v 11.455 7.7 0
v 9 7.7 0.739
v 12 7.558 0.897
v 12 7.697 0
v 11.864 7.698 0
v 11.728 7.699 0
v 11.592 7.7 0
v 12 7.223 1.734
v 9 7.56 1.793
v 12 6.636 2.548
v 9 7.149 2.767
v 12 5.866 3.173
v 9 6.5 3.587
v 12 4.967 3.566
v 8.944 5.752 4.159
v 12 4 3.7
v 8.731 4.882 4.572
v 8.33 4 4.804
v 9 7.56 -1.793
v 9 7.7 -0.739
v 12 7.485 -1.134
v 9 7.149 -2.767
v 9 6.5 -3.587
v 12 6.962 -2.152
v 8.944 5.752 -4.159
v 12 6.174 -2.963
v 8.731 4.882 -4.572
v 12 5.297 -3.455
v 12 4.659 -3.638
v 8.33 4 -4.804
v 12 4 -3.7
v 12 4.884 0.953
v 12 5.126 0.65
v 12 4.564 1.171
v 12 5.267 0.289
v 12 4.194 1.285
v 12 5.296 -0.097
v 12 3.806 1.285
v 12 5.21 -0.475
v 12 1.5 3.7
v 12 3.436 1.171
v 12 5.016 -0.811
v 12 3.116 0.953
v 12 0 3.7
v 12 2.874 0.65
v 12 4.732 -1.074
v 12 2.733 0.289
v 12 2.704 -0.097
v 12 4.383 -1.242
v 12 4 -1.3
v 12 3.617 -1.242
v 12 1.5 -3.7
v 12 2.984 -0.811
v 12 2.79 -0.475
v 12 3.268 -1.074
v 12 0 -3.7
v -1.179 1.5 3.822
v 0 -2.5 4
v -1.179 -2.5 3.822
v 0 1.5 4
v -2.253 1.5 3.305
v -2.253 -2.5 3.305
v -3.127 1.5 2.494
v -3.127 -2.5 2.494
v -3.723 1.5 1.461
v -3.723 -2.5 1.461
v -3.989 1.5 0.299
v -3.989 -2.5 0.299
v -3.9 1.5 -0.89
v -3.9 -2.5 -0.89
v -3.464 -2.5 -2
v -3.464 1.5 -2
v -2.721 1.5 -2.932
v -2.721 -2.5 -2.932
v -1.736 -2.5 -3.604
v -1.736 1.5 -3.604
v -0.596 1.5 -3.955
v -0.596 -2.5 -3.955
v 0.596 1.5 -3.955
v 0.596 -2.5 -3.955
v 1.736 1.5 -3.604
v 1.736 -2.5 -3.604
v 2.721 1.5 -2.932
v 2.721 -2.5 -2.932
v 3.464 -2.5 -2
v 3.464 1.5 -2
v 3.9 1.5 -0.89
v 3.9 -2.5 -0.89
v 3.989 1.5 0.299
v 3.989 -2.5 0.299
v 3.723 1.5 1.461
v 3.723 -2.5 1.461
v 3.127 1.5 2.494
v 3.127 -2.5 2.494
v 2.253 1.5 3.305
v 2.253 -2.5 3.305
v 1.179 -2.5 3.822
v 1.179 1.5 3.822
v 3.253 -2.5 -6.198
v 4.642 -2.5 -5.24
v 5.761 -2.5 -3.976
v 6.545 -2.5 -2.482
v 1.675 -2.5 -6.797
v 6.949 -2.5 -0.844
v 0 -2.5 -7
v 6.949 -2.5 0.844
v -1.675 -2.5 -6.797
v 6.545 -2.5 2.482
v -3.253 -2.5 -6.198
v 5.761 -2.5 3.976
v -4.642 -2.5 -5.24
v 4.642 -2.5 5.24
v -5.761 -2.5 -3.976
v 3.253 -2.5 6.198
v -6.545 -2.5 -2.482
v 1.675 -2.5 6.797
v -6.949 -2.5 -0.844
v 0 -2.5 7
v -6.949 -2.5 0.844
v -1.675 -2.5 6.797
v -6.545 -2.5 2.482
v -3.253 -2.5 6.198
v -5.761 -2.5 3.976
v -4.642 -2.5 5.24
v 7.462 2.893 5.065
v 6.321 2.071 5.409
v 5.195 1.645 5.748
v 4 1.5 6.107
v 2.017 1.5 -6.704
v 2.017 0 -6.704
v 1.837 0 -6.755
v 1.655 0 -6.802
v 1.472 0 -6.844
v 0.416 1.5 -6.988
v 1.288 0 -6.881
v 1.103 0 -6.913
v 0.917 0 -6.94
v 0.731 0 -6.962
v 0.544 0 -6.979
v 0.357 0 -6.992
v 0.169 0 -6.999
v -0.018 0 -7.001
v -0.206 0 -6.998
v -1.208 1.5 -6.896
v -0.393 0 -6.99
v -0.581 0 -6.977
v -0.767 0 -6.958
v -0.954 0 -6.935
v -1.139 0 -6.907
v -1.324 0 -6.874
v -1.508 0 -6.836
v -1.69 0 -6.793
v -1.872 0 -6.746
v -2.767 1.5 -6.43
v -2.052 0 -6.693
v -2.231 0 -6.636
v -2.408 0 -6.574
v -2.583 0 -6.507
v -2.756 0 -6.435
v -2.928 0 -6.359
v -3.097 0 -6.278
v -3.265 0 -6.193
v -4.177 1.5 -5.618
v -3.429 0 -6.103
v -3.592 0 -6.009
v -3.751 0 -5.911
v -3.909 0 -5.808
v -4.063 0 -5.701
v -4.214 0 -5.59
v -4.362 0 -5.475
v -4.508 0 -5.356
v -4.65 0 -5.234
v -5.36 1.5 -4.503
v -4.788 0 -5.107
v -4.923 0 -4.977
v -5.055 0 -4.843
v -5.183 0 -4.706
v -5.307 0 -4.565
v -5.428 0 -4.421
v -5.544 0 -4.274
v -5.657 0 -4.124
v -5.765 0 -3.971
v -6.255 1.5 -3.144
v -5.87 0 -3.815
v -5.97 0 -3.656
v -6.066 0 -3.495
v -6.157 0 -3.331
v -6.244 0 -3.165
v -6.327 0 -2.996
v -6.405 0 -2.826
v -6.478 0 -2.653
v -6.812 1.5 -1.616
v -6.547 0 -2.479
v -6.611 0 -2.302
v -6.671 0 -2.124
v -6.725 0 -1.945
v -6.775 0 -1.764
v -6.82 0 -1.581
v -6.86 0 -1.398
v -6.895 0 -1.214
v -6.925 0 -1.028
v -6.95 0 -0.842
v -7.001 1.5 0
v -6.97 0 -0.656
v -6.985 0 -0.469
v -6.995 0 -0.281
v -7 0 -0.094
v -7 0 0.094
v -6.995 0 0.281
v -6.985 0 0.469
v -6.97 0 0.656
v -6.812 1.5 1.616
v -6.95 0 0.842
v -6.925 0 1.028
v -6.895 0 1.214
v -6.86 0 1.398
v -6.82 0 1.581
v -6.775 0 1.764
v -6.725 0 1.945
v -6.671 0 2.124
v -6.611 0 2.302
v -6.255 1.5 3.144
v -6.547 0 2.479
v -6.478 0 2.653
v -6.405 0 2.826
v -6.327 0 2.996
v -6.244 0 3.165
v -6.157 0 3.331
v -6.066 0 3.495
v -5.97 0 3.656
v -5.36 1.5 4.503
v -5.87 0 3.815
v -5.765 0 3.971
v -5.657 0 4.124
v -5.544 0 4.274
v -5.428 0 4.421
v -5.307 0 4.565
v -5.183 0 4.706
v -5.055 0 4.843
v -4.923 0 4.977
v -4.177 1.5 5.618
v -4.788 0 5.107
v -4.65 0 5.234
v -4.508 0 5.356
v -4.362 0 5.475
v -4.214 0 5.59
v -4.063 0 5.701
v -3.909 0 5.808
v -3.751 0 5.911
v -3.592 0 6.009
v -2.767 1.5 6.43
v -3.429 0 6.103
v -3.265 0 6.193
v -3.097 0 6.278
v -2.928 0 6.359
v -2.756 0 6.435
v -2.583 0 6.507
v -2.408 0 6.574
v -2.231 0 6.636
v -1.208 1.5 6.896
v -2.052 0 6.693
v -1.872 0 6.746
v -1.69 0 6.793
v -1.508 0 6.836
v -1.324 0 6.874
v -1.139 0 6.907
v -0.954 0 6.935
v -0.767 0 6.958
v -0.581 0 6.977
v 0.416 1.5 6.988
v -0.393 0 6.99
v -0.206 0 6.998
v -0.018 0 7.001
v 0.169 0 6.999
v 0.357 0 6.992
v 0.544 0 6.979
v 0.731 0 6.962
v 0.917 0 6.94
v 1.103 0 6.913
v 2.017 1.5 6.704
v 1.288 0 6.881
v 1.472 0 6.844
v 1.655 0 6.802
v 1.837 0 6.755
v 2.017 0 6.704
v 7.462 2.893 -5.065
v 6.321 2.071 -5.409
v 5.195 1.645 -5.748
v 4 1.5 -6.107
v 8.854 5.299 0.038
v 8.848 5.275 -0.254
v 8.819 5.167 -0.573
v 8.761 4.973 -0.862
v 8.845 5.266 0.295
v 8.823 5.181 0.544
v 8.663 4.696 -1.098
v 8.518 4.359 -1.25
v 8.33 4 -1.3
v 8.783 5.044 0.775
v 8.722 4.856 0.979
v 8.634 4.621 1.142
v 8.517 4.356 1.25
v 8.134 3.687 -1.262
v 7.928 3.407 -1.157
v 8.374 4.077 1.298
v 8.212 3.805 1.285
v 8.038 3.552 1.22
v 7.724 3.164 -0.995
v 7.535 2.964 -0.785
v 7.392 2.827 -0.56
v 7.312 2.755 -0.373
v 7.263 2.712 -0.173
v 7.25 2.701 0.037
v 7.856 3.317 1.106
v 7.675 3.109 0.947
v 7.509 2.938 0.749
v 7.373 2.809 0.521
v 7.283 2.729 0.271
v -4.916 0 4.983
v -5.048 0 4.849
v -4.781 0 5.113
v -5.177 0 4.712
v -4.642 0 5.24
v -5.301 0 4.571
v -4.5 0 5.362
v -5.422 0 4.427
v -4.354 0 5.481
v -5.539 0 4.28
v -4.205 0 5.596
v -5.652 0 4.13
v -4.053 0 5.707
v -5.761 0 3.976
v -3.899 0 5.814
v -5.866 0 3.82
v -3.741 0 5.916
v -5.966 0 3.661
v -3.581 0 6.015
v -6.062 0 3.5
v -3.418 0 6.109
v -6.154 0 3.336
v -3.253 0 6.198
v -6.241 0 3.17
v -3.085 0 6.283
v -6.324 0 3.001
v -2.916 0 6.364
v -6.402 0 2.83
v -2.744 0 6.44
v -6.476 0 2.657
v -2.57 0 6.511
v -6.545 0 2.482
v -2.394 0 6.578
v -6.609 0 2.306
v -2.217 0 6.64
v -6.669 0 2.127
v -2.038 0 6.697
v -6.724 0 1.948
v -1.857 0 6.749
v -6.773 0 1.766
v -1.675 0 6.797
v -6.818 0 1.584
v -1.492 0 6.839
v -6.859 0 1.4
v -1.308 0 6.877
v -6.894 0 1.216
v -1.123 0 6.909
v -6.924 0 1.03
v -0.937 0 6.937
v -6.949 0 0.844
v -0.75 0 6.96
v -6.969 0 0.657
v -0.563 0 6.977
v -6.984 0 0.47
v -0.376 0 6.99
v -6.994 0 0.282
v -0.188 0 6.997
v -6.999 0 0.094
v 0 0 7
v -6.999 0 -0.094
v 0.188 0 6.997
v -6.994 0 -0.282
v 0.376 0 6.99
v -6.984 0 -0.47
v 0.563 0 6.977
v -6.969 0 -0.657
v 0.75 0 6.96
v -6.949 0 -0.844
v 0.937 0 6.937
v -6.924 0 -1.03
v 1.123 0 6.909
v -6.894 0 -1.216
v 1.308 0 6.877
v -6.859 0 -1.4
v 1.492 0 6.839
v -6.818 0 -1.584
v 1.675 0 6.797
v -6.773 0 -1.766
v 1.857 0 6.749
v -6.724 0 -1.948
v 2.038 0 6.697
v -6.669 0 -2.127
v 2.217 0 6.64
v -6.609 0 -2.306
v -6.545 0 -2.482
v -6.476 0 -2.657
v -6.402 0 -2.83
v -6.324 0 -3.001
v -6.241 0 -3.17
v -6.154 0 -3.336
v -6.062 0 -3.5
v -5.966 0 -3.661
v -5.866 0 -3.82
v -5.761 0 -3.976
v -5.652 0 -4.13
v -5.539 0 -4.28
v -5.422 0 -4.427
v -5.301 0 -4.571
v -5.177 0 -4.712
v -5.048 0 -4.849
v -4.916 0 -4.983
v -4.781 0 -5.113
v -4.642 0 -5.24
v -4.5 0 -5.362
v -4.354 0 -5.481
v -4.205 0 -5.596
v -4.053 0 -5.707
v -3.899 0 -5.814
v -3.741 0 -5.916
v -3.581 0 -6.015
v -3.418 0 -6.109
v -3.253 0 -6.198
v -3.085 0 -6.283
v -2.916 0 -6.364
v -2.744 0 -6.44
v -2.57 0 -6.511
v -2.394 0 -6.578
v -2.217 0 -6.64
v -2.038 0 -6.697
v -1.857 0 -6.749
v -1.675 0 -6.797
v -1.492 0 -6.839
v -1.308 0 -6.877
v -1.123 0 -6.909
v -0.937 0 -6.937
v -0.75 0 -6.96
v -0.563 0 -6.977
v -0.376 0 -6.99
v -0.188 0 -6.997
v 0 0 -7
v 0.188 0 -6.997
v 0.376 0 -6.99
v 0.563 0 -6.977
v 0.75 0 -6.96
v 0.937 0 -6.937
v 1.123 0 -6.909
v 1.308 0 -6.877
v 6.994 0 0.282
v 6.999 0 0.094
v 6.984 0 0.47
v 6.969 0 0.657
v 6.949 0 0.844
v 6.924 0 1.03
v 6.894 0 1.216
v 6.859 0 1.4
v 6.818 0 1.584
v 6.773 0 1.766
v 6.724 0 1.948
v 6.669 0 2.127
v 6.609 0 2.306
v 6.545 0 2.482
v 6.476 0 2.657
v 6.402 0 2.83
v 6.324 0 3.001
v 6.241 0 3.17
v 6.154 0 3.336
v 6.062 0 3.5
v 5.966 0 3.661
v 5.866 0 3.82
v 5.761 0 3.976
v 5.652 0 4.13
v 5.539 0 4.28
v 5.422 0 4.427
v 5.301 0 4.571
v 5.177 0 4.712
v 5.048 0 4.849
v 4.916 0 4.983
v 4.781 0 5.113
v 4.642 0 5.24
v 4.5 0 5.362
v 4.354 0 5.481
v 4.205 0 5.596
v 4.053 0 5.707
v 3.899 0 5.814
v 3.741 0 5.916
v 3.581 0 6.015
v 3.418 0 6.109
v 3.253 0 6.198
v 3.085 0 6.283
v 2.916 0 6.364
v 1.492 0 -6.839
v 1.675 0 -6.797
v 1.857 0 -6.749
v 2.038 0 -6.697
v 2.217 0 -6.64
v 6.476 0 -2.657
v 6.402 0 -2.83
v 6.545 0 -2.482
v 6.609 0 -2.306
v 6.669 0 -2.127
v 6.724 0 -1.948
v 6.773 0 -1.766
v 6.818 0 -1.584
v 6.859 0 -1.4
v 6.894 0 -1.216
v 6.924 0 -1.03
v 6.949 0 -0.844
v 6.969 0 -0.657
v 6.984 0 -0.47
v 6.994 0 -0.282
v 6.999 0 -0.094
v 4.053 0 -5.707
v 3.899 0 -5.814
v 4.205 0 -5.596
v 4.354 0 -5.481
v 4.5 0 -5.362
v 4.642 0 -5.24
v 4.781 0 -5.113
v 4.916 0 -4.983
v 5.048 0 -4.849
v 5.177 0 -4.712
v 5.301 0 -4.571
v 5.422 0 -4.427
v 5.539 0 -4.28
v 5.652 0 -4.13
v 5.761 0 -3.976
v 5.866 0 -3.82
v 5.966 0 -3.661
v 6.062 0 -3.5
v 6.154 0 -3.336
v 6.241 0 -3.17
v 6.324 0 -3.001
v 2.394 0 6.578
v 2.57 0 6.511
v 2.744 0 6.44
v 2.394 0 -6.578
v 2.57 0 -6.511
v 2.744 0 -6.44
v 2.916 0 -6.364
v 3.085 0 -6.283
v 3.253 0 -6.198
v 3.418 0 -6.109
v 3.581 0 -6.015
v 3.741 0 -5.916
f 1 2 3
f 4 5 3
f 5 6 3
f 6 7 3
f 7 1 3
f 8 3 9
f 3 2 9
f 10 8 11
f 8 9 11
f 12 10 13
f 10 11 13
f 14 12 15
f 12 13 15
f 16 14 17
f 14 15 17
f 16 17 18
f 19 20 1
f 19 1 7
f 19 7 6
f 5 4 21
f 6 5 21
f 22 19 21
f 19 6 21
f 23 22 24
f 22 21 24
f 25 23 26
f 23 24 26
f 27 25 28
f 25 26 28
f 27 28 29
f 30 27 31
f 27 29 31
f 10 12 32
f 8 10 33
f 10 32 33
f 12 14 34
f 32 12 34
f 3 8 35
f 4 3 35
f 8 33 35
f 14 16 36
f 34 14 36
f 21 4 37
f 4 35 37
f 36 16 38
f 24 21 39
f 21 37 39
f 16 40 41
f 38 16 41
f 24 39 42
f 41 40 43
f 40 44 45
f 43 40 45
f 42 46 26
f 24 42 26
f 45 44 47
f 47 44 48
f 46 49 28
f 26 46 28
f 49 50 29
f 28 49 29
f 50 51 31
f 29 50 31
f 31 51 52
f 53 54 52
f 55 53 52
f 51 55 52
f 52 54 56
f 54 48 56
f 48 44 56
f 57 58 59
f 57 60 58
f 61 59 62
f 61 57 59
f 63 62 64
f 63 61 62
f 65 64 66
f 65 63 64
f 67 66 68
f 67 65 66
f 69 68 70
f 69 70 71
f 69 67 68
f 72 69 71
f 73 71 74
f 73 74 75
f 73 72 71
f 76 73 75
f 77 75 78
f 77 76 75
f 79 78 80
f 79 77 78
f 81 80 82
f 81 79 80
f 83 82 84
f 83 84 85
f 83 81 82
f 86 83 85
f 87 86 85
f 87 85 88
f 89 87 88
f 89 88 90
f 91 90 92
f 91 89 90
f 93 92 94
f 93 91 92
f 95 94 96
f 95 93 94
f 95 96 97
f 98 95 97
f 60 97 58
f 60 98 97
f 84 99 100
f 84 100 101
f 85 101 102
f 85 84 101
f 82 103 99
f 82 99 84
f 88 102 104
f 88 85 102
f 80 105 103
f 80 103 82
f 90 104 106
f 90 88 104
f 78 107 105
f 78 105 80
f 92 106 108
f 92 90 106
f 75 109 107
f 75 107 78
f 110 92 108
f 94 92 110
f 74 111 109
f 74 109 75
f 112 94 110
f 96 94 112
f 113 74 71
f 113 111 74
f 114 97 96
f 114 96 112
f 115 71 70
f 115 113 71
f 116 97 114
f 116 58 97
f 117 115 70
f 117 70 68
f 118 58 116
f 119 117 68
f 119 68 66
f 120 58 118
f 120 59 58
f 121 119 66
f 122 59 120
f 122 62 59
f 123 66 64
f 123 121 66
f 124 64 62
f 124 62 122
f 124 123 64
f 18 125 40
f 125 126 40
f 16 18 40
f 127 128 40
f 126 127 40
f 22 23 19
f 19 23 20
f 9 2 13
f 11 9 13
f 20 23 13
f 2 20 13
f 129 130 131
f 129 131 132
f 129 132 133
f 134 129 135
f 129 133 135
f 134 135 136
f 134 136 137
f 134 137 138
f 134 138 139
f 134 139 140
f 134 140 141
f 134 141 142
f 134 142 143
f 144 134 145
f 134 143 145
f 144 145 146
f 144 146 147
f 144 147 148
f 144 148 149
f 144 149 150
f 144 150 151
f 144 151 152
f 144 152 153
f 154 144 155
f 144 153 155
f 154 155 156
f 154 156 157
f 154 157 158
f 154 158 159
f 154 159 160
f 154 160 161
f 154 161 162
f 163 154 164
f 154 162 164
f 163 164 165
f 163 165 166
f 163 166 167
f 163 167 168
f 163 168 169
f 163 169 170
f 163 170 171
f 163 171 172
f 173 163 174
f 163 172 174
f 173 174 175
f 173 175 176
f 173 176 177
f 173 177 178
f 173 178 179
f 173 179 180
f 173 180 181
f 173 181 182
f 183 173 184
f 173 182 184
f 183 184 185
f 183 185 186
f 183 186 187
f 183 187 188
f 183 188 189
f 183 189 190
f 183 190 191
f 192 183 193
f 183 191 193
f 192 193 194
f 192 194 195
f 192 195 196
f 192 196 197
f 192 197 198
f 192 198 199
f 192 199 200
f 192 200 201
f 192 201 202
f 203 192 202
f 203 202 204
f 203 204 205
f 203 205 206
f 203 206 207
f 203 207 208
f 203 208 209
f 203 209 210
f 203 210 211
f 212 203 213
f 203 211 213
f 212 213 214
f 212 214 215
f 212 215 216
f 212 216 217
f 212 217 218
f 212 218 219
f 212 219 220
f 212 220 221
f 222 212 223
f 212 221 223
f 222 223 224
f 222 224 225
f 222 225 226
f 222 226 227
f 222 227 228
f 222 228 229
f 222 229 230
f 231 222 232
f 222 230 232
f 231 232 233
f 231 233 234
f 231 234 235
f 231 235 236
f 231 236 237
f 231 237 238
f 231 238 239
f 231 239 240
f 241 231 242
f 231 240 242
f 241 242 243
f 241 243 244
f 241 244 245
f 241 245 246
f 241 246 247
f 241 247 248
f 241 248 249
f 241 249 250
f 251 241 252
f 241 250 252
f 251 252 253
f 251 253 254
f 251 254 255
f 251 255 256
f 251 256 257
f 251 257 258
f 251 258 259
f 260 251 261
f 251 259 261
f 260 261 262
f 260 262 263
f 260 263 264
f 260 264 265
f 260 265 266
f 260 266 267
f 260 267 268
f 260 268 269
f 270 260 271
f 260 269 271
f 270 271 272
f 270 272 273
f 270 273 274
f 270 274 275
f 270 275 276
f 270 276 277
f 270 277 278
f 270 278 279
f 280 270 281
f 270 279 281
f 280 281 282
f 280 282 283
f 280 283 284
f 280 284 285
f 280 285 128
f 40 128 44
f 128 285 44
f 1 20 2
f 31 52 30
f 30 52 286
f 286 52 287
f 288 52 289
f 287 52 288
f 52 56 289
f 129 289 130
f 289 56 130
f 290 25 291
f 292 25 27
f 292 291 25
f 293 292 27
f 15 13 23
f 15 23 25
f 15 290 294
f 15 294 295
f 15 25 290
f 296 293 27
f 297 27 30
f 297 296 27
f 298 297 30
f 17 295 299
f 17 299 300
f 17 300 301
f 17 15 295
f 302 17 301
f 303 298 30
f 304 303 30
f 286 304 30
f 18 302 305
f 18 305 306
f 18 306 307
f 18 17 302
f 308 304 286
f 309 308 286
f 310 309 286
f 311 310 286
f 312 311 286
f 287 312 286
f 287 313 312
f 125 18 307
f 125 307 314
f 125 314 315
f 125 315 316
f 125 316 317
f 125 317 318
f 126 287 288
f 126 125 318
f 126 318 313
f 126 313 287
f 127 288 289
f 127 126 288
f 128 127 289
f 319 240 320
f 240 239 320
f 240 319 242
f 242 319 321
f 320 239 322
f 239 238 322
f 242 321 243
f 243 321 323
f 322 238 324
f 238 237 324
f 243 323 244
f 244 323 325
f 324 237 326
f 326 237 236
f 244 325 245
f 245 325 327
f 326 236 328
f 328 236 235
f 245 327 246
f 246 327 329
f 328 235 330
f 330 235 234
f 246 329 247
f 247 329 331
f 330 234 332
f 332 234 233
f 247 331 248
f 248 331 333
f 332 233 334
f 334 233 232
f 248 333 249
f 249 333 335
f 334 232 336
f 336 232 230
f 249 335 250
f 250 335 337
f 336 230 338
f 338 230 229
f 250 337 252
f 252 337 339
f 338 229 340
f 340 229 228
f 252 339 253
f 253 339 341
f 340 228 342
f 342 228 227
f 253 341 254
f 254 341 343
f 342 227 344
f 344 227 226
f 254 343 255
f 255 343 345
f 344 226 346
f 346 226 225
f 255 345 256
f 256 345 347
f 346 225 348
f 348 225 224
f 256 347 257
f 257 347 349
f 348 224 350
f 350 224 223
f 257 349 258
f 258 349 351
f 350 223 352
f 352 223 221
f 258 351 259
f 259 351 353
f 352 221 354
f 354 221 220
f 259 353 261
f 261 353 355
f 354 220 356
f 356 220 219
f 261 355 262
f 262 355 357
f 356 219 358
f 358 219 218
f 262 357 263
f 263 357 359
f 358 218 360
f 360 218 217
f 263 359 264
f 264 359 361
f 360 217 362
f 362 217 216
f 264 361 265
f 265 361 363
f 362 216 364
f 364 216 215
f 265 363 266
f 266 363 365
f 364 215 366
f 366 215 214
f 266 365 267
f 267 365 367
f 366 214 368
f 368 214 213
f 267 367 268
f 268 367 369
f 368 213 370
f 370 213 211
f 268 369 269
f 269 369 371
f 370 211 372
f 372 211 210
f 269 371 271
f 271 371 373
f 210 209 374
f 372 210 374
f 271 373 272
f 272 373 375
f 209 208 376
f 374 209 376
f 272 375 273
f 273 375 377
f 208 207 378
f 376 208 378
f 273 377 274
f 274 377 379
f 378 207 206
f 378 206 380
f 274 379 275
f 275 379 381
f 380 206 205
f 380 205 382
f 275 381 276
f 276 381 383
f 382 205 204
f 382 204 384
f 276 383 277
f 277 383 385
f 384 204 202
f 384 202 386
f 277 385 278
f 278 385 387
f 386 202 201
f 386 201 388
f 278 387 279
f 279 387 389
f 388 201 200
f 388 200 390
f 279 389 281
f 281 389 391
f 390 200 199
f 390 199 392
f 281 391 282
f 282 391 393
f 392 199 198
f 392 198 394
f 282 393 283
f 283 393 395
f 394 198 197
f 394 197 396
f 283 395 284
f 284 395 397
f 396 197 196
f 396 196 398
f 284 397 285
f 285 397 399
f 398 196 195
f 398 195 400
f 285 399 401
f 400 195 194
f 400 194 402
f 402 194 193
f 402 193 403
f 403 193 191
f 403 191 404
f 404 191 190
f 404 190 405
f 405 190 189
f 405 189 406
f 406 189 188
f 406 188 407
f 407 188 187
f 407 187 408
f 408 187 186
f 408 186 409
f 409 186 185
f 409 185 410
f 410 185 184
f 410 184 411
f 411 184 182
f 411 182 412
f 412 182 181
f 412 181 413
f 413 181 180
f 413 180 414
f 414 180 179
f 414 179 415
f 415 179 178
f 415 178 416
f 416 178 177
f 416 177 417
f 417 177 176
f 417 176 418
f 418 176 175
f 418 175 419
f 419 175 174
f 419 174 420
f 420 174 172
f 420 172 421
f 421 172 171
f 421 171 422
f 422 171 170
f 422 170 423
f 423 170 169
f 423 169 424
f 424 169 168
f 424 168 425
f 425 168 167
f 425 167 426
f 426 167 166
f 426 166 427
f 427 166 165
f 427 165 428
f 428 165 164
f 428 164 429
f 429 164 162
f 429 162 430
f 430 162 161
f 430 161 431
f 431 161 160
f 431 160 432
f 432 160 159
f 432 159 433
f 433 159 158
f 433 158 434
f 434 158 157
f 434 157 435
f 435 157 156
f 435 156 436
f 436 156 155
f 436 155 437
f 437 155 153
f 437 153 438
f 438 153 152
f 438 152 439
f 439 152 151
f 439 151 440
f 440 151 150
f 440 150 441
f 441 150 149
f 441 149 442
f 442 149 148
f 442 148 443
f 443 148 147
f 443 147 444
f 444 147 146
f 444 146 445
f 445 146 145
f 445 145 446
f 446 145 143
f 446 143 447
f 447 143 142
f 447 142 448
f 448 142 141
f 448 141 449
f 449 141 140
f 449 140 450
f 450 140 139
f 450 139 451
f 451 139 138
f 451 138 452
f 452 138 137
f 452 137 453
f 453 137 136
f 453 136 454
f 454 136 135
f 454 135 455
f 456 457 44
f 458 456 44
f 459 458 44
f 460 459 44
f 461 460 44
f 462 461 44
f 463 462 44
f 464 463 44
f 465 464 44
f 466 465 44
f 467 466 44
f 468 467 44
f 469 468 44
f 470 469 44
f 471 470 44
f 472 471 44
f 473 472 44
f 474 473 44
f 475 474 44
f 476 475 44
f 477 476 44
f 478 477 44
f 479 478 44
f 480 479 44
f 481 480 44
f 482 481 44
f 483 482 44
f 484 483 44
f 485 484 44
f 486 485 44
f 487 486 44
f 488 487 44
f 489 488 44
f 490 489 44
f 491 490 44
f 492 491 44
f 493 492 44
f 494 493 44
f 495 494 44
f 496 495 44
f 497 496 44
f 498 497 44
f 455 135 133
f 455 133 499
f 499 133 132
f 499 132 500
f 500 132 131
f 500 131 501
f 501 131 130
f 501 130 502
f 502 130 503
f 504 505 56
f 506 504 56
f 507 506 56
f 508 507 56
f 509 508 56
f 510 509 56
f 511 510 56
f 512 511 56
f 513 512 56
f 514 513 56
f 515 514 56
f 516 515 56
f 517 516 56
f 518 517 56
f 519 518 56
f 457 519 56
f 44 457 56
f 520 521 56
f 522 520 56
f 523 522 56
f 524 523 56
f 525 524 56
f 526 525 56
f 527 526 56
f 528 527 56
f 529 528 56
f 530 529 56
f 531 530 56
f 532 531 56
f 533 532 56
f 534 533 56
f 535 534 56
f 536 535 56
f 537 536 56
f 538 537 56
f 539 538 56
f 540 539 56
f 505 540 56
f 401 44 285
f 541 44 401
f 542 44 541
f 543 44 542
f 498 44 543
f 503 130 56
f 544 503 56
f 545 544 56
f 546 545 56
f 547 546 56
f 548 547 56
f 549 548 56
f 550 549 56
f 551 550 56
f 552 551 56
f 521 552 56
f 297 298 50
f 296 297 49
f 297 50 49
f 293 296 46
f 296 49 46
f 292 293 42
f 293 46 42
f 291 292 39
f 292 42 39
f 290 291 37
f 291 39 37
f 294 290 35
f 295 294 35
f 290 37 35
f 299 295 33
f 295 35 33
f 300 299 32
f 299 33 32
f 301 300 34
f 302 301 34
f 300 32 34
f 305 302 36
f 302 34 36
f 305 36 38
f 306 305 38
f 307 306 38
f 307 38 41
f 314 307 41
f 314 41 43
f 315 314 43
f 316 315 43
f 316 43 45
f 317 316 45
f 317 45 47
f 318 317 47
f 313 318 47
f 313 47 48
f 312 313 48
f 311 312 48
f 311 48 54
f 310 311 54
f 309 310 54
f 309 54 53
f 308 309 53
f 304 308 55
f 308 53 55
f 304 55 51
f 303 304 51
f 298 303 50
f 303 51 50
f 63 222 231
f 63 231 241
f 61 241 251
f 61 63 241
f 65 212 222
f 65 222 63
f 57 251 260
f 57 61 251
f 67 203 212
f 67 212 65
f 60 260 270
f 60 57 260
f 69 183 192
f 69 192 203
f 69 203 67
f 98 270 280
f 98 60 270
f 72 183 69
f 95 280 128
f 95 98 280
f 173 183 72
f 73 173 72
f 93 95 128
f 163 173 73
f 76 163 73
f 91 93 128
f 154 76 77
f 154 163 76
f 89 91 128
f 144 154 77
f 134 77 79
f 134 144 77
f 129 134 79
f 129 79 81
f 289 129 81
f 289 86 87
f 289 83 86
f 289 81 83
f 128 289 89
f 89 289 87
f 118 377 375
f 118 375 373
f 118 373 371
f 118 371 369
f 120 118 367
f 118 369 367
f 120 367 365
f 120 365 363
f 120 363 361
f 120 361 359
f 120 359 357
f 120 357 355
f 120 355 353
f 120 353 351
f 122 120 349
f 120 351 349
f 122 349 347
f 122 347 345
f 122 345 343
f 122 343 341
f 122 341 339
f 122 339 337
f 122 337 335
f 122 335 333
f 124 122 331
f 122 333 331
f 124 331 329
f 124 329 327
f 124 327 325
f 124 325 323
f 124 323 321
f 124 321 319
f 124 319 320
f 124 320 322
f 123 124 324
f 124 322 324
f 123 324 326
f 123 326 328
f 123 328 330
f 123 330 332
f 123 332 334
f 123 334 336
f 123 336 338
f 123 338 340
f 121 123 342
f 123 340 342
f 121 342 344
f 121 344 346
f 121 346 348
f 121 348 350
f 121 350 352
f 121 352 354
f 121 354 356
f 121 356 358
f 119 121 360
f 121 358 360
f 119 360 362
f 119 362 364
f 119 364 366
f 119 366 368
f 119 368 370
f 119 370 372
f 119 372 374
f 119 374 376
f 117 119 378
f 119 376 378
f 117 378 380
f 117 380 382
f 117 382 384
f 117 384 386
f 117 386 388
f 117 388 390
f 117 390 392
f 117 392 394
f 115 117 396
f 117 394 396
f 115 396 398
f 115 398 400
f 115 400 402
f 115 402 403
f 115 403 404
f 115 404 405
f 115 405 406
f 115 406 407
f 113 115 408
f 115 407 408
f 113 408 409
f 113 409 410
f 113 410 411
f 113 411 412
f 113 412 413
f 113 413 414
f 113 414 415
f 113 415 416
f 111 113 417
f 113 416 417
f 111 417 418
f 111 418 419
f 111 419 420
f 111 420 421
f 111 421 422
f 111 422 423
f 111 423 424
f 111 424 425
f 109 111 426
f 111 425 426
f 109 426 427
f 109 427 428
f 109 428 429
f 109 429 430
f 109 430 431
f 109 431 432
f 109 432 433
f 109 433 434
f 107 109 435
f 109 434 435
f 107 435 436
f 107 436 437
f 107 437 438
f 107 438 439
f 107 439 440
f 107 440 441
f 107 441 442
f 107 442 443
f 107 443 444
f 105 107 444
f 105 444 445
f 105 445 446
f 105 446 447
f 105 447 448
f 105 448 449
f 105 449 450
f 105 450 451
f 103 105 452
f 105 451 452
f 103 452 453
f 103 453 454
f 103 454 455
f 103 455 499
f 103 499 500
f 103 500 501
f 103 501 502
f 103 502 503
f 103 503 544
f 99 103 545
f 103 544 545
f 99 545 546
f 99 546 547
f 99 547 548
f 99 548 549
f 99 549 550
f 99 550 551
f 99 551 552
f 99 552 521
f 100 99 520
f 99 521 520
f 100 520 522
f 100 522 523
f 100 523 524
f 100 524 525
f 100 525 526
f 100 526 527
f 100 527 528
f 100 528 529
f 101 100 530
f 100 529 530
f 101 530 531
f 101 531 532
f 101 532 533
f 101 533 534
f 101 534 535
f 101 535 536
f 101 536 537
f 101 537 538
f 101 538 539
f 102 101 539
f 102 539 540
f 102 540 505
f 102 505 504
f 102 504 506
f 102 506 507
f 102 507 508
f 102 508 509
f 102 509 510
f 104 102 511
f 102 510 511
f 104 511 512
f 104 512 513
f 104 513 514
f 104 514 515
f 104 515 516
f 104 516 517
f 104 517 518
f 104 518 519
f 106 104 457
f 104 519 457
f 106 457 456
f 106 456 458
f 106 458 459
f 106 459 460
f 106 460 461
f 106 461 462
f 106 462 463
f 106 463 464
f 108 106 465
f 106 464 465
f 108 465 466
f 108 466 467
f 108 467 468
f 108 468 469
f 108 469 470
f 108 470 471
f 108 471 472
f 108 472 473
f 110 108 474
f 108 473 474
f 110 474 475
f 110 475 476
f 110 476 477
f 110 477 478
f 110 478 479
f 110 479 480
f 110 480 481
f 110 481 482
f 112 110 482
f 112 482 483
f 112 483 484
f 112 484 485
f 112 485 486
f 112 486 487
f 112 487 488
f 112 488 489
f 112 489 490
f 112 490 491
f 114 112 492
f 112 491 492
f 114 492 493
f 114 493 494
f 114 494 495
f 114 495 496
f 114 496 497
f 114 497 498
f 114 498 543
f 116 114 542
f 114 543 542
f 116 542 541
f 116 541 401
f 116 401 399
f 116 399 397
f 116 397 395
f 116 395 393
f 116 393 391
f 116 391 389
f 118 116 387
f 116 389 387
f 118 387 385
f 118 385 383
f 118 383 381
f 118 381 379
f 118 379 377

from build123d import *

# Parameters (mm, degrees)
SKETCH_1_R          = 7
EXTRUDE_1_DEPTH     = 1.5
SKETCH_3_R          = 4
CUT_EXTRUDE_2_DEPTH = 11.012492197
EXTRUDE_START       = -1.5
SKETCH_5_R          = 7
EXTRUDE_2_DEPTH     = 1.5
SKETCH_11_R         = 7
SKETCH_11_R_2       = 4
EXTRUDE_4_DEPTH     = 2.5
EXTRUDE_6_DEPTH     = 6.2
FILLET_1_R          = 5
SKETCH_12_R         = 1.3
CUT_EXTRUDE_3_DEPTH = 22.663858813
FILLET_2_R          = 3.7


with BuildPart() as part:
    # Эскиз1 → Бобышка-Вытянуть1 (new body)
    with BuildSketch(Plane(origin=(0, 0, 0), x_dir=(1, 0, 0), z_dir=(0, 1, 0))):
        with Locations(Location((0, 0, 0), (0, 0, 270))):
            Circle(SKETCH_1_R)
    extrude(amount=EXTRUDE_1_DEPTH)

    # Эскиз3 → Вырез-Вытянуть2 (cut, through all)
    with BuildSketch(Plane(origin=(0, 1.5, 0), x_dir=(1, 0, 0), z_dir=(0, 1, 0))):
        with Locations(Location((0, 0, 0), (0, 0, 270))):
            Circle(SKETCH_3_R)
    extrude(amount=-CUT_EXTRUDE_2_DEPTH, mode=Mode.SUBTRACT)

    # Эскиз5 → Бобышка-Вытянуть2 (add)
    with BuildSketch(Plane(origin=(0, 1.5, 0), x_dir=(1, 0, 0), z_dir=(0, 1, 0)).offset(EXTRUDE_START)):
        with BuildLine():
            ThreePointArc((2.017080382, 6.703746112), (-7.000630343, 0), (2.017080382, -6.703746112))
            Line((2.017080382, -6.703746112), (12, -3.7))
            Line((12, -3.7), (12, 3.7))
            Line((12, 3.7), (2.017080382, 6.703746112))
        make_face()
        Circle(SKETCH_5_R, mode=Mode.SUBTRACT)
    extrude(amount=EXTRUDE_2_DEPTH)

    # Эскиз11 → Бобышка-Вытянуть4 (add)
    with BuildSketch(Plane(origin=(0, 0, 0), x_dir=(-1, 0, 0), z_dir=(0, -1, 0))):
        with Locations(Location((0, 0, 0), (0, 0, 270))):
            Circle(SKETCH_11_R)
        with Locations(Location((0, 0, 0), (0, 0, 270))):
            Circle(SKETCH_11_R_2, mode=Mode.SUBTRACT)
    extrude(amount=EXTRUDE_4_DEPTH)

    # Эскиз13 → Бобышка-Вытянуть6 (add)
    with BuildSketch(Plane(origin=(0, 1.5, 0), x_dir=(1, 0, 0), z_dir=(0, 1, 0))):
        Polygon((9, 4.602665621), (9, 0), (9, -4.602665621), (12, -3.7), (12, 3.7), align=None)
    extrude(amount=EXTRUDE_6_DEPTH)

    # Скругление1
    fillet_1_edges = [part.edges().sort_by_distance(p)[0] for p in [
        (9, 1.5, 0),
    ]]
    fillet(fillet_1_edges, radius=FILLET_1_R)

    # Эскиз12 → Вырез-Вытянуть3 (cut, through all)
    with BuildSketch(Plane(origin=(12, 0, 0), x_dir=(0, 0, -1), z_dir=(1, 0, 0))):
        with Locations((0, 4)):
            Circle(SKETCH_12_R)
    extrude(amount=-CUT_EXTRUDE_3_DEPTH, mode=Mode.SUBTRACT)

    # Скругление2
    # the kernel refuses this fillet: 3.7 mm, written as the material it takes off along each edge
    with BuildSketch(Plane(origin=(0.142275982, 7.7, 7.267853272), x_dir=(0, -1, 0), z_dir=(0.9575917857777037, 0, -0.28812839466298473)), Plane(origin=(20.857724018, 7.7, -1.034812349), x_dir=(0, -1, 0), z_dir=(-0.9575917857777037, 0, -0.28812839466298473))) as fillet_2_piece_1:
        with BuildLine():
            CenterArc((FILLET_2_R, FILLET_2_R), FILLET_2_R, 180, 90)
            Line((0, FILLET_2_R), (0, 0))
            Line((0, 0), (FILLET_2_R, 0))
        make_face()
    extrude(amount=21.632858954, mode=Mode.SUBTRACT)


solid = part.part
